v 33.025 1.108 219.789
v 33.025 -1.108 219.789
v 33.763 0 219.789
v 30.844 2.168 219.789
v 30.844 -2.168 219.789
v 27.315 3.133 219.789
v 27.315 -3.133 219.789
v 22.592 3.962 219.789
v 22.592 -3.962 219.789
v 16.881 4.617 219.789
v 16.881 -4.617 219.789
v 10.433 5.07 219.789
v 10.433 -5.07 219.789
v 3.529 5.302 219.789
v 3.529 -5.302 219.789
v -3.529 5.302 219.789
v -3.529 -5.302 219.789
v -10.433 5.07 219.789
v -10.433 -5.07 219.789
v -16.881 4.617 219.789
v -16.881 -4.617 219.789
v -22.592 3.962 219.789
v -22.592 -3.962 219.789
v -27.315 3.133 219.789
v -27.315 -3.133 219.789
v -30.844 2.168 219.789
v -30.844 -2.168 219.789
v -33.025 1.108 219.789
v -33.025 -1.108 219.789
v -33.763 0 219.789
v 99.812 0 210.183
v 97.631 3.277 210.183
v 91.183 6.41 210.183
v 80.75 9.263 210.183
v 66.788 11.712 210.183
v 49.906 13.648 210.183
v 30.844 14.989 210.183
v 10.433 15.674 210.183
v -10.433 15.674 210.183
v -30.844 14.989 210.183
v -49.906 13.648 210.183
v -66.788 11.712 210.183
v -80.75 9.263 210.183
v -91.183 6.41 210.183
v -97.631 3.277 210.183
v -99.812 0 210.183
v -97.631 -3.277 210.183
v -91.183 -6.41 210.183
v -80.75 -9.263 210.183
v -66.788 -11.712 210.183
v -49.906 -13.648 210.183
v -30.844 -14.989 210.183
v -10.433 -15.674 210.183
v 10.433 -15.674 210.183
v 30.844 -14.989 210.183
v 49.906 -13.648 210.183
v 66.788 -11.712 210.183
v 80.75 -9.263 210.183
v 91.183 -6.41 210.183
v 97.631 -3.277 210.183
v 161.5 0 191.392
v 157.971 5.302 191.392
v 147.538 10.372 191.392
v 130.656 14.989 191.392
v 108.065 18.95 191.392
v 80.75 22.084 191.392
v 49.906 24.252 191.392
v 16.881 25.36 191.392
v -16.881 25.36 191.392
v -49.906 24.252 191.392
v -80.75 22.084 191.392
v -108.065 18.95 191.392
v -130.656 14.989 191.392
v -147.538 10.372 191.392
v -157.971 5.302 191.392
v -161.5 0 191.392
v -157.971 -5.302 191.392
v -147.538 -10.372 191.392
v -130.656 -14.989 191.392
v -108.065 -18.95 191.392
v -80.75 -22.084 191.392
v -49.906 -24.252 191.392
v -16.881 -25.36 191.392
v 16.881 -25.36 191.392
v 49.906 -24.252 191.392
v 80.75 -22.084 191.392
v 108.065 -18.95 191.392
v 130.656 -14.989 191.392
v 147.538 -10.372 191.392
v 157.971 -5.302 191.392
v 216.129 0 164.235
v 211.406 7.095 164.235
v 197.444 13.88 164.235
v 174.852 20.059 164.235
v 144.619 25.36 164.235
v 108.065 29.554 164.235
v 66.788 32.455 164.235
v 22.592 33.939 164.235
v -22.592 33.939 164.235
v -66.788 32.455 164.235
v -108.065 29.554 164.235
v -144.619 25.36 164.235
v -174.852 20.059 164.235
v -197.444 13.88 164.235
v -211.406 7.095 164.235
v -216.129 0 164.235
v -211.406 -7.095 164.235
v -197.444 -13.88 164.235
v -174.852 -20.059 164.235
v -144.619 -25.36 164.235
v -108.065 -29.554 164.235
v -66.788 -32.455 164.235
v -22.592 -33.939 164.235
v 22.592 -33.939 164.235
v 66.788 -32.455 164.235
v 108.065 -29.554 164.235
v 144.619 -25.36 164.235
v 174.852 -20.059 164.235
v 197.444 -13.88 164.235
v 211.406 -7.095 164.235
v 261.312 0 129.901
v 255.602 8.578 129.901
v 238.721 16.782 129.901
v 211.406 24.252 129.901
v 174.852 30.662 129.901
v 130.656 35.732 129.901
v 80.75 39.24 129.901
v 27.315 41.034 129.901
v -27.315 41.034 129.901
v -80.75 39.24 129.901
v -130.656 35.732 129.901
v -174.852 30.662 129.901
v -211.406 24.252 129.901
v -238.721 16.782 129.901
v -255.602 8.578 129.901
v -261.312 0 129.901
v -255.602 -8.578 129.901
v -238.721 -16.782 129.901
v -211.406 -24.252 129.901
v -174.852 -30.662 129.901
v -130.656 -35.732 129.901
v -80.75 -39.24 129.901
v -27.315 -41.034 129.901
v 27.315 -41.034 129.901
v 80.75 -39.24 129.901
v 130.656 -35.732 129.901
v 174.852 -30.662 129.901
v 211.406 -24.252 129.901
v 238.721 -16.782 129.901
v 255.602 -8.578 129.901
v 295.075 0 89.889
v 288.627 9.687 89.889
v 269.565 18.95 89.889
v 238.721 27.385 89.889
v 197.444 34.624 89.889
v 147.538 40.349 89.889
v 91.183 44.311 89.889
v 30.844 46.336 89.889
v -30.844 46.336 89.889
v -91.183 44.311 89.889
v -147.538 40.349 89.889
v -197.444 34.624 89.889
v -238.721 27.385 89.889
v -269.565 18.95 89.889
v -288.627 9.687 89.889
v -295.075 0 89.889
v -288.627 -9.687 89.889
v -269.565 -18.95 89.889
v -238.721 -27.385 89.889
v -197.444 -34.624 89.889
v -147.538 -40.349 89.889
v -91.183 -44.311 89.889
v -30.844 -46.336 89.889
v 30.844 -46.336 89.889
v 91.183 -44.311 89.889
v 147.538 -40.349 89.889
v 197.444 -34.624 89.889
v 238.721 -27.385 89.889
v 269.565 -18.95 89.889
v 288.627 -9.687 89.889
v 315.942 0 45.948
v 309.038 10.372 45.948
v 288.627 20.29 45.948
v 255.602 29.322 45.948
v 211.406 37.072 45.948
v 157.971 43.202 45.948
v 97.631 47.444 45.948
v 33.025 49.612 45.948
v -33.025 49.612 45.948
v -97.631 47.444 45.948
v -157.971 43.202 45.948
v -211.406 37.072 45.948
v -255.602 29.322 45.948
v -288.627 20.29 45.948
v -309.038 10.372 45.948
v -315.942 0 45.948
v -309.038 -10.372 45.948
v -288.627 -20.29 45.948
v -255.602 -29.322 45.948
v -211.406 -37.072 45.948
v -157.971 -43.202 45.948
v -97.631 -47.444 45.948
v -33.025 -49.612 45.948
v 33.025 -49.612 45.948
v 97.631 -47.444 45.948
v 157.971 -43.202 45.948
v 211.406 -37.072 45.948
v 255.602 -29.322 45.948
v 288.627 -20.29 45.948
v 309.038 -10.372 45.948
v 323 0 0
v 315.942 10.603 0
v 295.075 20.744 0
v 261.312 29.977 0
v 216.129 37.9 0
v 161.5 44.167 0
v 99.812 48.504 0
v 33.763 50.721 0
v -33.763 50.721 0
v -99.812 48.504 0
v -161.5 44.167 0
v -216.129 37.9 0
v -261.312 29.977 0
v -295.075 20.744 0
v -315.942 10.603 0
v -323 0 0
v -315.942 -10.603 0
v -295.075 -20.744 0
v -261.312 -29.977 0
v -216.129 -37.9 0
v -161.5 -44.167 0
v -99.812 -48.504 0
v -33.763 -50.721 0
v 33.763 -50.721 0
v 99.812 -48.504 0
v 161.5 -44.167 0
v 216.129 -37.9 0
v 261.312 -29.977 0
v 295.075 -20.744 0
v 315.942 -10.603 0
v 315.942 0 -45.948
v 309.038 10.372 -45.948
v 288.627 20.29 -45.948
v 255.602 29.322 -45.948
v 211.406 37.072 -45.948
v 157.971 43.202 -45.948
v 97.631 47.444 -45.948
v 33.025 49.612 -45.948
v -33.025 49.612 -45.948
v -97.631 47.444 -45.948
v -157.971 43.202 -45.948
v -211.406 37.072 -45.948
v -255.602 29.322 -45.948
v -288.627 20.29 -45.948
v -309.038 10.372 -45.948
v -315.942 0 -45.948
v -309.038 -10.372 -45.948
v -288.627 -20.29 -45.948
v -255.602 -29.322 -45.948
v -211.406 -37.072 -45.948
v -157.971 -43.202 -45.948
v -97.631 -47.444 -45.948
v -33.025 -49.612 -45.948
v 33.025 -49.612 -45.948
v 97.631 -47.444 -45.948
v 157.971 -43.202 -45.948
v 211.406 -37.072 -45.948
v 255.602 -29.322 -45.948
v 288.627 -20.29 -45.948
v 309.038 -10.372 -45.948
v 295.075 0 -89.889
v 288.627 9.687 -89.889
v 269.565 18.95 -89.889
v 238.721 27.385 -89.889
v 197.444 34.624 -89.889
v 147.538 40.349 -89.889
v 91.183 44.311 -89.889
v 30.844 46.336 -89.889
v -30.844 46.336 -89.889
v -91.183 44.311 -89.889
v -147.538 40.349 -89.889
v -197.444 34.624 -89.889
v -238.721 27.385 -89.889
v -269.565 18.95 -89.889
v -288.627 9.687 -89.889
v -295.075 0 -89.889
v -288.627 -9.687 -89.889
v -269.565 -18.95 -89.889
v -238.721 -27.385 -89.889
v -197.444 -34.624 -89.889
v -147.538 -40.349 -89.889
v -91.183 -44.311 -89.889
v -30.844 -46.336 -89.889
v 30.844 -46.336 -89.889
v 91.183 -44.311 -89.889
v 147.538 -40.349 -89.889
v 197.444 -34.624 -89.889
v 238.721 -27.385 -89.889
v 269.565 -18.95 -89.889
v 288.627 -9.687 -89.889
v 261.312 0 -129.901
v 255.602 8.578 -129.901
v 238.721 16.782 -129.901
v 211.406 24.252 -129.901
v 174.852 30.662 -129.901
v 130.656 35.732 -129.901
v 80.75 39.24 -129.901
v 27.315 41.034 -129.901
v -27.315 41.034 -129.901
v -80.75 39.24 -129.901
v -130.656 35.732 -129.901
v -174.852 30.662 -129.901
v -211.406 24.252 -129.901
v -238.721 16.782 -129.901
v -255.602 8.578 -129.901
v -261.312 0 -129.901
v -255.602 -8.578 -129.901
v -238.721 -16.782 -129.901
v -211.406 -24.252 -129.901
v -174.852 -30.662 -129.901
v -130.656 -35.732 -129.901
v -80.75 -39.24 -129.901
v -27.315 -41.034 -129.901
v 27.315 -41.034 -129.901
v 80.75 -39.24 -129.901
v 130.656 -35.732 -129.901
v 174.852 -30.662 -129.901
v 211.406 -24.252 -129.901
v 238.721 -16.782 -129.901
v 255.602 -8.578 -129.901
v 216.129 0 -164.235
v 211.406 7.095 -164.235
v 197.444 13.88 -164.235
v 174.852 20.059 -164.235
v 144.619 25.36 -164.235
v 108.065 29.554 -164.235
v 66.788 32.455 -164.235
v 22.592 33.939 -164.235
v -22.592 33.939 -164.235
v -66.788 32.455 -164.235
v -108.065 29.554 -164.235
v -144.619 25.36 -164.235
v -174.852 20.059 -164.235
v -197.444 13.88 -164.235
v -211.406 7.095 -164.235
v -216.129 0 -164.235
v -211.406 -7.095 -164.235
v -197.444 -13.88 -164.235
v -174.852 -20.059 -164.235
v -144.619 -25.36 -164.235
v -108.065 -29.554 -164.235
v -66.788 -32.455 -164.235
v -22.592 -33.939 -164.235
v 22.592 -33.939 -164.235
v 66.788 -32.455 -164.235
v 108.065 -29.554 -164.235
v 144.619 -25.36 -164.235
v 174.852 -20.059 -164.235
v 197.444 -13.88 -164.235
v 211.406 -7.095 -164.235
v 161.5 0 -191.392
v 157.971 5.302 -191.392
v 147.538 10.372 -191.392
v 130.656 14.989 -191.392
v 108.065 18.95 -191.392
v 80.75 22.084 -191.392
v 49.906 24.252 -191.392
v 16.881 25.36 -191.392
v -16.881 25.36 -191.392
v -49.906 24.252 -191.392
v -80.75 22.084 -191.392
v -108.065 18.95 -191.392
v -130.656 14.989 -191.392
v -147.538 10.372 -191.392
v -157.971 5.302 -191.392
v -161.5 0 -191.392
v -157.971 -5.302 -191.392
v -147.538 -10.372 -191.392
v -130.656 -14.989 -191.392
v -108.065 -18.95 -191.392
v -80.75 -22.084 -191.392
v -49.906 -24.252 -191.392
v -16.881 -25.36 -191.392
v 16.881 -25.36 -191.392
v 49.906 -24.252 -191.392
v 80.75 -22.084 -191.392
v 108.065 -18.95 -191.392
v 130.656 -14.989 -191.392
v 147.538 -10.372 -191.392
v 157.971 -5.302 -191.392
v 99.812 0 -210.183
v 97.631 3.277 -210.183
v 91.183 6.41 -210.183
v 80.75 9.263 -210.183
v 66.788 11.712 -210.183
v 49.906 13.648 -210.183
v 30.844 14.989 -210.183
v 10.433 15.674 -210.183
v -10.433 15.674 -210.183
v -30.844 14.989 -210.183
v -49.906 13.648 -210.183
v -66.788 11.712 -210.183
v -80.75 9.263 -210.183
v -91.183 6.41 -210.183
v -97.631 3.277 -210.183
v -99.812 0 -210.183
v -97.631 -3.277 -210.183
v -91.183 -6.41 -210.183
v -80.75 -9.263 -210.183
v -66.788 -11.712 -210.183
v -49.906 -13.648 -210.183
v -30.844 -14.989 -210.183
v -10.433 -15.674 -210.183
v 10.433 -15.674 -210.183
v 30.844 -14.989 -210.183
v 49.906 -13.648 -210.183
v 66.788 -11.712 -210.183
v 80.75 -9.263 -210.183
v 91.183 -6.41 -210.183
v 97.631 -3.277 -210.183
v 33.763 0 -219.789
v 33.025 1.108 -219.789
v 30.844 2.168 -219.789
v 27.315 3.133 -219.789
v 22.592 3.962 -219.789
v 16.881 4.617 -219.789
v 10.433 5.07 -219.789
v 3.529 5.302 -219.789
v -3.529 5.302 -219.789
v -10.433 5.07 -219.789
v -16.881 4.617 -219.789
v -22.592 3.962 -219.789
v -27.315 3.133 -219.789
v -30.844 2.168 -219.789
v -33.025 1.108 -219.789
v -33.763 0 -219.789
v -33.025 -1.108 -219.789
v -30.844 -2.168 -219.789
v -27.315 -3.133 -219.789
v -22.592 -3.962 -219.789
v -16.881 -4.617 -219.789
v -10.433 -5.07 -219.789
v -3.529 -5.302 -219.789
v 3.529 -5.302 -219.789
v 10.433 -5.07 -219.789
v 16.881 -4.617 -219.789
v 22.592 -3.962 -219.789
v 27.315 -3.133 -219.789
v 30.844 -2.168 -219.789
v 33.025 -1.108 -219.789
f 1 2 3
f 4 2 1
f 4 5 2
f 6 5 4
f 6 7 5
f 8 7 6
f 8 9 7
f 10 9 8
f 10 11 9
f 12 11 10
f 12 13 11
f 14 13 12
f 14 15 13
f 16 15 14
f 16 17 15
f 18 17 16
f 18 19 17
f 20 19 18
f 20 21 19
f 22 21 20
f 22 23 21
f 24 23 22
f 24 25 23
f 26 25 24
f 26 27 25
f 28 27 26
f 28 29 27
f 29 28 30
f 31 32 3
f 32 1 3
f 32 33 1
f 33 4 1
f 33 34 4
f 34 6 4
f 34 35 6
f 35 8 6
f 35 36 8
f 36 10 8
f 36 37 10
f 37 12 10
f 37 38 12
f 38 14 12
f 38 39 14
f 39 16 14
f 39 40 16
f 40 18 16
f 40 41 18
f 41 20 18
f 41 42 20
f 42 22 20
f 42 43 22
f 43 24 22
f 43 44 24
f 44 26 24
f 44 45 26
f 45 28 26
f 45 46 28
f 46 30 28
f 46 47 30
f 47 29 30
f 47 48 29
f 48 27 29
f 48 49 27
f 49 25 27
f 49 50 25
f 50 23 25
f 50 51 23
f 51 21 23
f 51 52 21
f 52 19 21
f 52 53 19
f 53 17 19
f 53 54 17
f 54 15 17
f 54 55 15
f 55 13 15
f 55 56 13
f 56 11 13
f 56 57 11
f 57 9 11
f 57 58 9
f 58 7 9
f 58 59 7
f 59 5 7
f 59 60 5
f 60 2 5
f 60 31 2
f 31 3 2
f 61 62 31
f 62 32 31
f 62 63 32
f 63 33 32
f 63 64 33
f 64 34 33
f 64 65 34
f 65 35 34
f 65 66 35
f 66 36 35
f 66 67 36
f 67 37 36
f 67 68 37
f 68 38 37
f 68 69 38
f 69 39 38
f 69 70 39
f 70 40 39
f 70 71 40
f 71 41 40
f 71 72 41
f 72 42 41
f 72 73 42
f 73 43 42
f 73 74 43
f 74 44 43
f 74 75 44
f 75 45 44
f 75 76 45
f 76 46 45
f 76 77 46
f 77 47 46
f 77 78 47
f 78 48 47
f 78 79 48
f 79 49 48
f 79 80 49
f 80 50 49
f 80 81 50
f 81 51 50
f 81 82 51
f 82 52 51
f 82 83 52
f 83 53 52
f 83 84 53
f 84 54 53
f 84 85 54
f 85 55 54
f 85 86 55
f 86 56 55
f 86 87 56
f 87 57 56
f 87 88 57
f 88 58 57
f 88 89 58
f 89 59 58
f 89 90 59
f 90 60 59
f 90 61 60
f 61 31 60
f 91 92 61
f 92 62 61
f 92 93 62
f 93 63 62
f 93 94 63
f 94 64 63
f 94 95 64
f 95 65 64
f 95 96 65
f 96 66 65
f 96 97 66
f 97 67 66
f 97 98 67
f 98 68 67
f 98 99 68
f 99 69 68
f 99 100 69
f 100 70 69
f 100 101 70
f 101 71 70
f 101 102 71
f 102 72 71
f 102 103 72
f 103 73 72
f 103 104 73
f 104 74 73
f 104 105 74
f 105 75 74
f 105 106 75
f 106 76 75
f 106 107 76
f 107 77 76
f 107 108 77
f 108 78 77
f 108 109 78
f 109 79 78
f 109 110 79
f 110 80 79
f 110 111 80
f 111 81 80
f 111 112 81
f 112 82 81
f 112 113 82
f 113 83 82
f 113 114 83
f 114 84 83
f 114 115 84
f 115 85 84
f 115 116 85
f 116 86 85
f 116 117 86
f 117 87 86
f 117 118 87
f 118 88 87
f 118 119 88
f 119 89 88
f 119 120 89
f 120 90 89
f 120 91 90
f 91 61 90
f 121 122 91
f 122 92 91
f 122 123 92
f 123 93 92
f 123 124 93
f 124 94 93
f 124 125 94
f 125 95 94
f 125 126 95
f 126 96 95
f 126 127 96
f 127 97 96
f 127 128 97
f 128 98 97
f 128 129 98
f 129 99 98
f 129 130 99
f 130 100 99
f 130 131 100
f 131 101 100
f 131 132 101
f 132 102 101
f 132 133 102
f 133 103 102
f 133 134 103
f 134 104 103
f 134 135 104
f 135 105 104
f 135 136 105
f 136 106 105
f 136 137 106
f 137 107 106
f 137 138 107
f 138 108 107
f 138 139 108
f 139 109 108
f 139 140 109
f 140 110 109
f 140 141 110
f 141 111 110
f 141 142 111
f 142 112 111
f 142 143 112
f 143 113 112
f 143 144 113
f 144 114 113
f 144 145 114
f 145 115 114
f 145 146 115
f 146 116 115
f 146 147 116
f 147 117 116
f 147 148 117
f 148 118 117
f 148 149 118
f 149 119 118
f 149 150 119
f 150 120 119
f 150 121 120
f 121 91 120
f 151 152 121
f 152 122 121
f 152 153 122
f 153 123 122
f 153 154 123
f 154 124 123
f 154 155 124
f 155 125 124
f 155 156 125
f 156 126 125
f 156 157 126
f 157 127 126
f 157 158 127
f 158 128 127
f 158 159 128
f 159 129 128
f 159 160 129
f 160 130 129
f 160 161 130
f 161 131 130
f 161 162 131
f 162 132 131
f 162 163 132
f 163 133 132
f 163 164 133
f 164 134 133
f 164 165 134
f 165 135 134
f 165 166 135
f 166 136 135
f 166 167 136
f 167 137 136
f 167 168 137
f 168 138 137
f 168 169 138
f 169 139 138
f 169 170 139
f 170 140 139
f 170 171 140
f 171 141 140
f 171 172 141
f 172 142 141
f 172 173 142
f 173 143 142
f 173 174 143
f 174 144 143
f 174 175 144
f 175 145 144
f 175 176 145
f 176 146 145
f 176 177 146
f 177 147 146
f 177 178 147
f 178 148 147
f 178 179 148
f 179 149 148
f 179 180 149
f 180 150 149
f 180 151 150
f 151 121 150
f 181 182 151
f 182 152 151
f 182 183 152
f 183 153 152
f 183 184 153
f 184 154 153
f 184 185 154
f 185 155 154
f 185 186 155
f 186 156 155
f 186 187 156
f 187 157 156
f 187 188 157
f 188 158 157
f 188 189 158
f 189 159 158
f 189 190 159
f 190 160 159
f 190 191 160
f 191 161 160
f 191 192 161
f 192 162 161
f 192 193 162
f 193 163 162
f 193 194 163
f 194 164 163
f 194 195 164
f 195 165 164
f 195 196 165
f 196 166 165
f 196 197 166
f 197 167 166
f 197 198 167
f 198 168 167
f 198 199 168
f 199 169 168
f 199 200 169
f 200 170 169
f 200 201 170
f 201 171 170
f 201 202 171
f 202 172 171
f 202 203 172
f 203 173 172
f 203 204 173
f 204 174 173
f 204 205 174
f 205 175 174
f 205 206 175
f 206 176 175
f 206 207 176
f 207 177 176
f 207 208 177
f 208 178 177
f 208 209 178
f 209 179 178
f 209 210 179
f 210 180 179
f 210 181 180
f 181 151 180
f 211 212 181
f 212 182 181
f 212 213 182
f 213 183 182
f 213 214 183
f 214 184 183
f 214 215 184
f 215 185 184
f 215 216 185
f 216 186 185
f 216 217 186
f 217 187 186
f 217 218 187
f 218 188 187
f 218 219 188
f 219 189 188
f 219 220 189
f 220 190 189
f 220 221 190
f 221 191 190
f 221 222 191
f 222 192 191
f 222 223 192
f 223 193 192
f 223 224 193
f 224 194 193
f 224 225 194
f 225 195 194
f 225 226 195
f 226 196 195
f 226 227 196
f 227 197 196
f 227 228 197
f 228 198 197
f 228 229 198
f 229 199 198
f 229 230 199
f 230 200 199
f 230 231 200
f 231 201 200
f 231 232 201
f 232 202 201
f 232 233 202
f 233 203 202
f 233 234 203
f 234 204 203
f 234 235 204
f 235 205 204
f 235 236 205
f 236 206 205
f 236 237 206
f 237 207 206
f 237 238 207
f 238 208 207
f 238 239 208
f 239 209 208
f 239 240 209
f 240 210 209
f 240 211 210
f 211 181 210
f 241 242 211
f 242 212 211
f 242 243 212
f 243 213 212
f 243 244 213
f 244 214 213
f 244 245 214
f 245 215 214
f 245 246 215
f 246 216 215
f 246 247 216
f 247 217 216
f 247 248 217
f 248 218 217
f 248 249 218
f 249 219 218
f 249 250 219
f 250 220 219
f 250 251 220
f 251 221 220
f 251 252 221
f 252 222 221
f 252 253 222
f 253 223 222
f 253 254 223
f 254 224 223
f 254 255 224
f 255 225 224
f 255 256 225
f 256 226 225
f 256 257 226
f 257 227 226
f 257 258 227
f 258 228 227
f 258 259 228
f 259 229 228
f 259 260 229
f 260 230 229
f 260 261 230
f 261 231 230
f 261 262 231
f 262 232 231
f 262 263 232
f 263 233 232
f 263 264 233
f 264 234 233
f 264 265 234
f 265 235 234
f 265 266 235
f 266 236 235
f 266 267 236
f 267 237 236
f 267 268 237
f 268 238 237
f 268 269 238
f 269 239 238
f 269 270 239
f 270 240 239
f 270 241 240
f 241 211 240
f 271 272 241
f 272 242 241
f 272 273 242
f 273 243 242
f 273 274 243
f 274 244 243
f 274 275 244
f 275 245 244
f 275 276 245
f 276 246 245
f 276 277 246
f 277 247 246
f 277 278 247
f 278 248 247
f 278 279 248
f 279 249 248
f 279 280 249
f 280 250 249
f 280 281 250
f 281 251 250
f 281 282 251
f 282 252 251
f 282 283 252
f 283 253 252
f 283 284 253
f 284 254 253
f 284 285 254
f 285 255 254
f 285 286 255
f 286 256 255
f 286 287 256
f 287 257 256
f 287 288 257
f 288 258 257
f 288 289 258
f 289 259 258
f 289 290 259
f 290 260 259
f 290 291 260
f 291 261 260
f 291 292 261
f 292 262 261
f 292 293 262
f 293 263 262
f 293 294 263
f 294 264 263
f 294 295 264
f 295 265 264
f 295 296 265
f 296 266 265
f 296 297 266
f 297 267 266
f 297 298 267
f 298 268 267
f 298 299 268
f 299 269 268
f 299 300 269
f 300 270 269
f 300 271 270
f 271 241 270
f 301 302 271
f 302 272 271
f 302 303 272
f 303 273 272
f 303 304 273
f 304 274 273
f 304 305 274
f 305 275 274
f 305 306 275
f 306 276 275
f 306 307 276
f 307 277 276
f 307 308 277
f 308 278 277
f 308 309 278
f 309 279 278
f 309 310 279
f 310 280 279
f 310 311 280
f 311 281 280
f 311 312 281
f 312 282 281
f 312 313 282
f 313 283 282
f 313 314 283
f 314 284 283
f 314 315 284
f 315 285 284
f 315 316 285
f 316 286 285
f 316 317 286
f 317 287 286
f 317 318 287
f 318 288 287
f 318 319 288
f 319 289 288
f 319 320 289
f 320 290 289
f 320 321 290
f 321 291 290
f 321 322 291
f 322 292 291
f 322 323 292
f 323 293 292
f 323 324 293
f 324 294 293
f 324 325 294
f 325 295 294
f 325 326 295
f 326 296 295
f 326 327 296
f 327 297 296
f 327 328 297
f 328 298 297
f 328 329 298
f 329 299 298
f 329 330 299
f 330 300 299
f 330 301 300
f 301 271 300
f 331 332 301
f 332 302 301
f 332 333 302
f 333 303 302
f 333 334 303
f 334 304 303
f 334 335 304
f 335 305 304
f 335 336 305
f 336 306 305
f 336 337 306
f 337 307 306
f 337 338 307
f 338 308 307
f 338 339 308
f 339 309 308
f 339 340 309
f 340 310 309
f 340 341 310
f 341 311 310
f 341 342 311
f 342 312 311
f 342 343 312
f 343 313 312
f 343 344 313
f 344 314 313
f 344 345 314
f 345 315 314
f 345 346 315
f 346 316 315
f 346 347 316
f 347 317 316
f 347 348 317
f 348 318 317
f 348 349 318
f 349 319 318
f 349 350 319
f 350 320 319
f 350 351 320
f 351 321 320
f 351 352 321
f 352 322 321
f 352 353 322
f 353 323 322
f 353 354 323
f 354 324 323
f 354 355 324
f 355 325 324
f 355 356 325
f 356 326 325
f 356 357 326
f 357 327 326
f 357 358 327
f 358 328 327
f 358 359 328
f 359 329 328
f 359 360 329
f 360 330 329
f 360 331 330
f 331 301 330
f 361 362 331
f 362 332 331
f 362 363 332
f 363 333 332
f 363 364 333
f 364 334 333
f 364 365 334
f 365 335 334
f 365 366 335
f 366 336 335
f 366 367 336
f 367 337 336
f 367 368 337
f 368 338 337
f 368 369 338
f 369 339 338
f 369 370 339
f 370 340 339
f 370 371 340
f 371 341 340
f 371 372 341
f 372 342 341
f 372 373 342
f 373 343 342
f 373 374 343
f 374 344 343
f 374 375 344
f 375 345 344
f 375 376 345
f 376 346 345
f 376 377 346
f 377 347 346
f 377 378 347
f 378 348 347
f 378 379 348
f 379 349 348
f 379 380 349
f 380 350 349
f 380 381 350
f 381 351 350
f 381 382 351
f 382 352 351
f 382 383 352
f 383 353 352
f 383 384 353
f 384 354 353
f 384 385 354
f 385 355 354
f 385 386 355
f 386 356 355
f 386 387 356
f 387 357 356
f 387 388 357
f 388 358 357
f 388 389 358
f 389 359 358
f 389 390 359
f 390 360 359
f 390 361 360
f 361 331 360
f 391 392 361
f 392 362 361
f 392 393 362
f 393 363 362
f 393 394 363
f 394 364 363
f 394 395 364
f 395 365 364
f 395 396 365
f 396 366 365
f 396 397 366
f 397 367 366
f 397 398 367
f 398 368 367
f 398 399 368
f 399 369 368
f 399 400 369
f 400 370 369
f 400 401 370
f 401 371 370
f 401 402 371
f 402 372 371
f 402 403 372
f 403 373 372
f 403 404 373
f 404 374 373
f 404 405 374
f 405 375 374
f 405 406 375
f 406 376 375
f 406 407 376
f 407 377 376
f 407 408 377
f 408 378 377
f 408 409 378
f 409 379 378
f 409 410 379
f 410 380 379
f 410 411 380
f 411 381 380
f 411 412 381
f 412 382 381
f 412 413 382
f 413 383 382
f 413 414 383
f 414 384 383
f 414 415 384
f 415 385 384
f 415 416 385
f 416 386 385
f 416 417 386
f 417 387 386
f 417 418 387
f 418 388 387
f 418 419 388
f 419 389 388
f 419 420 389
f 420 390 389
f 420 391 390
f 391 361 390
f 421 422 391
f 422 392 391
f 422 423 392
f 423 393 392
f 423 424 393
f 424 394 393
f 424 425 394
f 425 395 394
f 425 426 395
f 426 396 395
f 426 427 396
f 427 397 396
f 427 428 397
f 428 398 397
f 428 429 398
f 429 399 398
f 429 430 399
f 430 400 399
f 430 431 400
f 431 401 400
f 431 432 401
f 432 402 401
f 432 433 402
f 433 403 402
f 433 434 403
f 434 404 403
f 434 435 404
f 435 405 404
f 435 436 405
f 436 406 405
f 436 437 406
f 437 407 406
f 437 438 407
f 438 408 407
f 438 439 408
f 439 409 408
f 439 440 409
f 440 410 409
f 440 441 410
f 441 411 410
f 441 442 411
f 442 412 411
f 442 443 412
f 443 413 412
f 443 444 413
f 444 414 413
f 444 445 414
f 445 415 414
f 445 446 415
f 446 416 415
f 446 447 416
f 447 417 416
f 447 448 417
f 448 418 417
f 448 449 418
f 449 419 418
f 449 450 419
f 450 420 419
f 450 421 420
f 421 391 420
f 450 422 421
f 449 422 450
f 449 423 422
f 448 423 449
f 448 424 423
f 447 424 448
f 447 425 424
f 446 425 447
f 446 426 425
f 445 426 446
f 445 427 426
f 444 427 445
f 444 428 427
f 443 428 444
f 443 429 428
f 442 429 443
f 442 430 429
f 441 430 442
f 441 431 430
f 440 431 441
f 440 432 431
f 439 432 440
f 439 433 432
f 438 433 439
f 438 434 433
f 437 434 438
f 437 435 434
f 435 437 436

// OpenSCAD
// Generated by SolidPython 1.0.1 on 2020-07-29 00:46:53


scale(v = [19, 3, 13]) {
	sphere(r = 17);
}
/***********************************************
*********      SolidPython code:      **********
************************************************
 
# import packages: SolidPython
from solid import *
from solid.utils import *
from itertools import chain, combinations, permutations


class Resize:

    def __init__(self, scad_file):
        self.scad_file = scad_file
        #self.scad_file = import_scad(scad_file)
        # cone/cylinder param:
        self.r1 = 0
        self.r2 = 0
        self.h = 0
        # rectangular prism param:
        self.w = 0
        self.l = 0
        # ellipse param:
        self.r = 0

    # import OpenScad code (file name corresponds to shape)


    # classify shape + parameters
    def assign(self, param1, param2, param3):
        if self.scad_file == 'cone.scad':
            self.r1 = param1
            self.r2 = param2
            self.h = param3
        elif self.scad_file == 'cylinder.scad':
            self.r1 = param1
            self.r2 = param2
            self.h = param3
        elif self.scad_file == 'rectangularPrism.scad':
            self.h = param1
            self.l = param2
            self.w = param3
        else:
            self.r = param1
            self.h = param2

    # resize parameters
    def iterate(self):
        x = range(3, 20, 2)
        i = 1
        if self.scad_file == 'cone.scad':
            tempList = list(permutations(x, 2))
            for temp in tempList:
                param1 = temp[0]
                param2 = temp[1]
                filepath = 'produced_scad_files/' + 'cone' + str(param1) + '_' + str(param2) + '_' + '.scad'
                scad_render_to_file(cylinder(h=param1, r1=param2, r2=0), filepath)

        elif self.scad_file == 'cylinder.scad':
            tempList = list(permutations(x, 3))
            for temp in tempList:
                param1 = temp[0]
                param2 = temp[1]
                filepath = 'produced_scad_files/' + 'cylinder' + str(param1) + '_' + str(param2) + '_' + '.scad'
                scad_render_to_file(cylinder(h=param1, r1=param2, r2=param2), filepath)

        elif self.scad_file == 'rectangularPrism.scad':
            tempList = list(permutations(x, 3))
            for temp in tempList:
                param1 = temp[0]
                param2 = temp[1]
                param3 = temp[2]
                filepath = 'produced_scad_files/' + 'rectangularPrism' + str(param1) + '_' + str(param2) + '_' + str(
                    param3) + '.scad'
                scad_render_to_file(cube(size=(param1, param2, param3)), filepath)

        elif self.scad_file == 'ellipse.scad':
            tempList = list(permutations(x, 4))
            for temp in tempList:
                param1 = temp[0]
                param2 = temp[1]
                param3 = temp[2]
                param4 = temp[3]
                filepath = 'produced_scad_files/' + 'ellipse' + str(param1) + '_' + str(param2) + '_' + str(param3) + '_' + str(param4) + '.scad'
                scad_render_to_file(scale([param1, param2, param3])(sphere(r=param4)), filepath)

    def render_to_scadfile(self):
        scad_render_to_file(scad, 'example.scad') 
 
************************************************/
